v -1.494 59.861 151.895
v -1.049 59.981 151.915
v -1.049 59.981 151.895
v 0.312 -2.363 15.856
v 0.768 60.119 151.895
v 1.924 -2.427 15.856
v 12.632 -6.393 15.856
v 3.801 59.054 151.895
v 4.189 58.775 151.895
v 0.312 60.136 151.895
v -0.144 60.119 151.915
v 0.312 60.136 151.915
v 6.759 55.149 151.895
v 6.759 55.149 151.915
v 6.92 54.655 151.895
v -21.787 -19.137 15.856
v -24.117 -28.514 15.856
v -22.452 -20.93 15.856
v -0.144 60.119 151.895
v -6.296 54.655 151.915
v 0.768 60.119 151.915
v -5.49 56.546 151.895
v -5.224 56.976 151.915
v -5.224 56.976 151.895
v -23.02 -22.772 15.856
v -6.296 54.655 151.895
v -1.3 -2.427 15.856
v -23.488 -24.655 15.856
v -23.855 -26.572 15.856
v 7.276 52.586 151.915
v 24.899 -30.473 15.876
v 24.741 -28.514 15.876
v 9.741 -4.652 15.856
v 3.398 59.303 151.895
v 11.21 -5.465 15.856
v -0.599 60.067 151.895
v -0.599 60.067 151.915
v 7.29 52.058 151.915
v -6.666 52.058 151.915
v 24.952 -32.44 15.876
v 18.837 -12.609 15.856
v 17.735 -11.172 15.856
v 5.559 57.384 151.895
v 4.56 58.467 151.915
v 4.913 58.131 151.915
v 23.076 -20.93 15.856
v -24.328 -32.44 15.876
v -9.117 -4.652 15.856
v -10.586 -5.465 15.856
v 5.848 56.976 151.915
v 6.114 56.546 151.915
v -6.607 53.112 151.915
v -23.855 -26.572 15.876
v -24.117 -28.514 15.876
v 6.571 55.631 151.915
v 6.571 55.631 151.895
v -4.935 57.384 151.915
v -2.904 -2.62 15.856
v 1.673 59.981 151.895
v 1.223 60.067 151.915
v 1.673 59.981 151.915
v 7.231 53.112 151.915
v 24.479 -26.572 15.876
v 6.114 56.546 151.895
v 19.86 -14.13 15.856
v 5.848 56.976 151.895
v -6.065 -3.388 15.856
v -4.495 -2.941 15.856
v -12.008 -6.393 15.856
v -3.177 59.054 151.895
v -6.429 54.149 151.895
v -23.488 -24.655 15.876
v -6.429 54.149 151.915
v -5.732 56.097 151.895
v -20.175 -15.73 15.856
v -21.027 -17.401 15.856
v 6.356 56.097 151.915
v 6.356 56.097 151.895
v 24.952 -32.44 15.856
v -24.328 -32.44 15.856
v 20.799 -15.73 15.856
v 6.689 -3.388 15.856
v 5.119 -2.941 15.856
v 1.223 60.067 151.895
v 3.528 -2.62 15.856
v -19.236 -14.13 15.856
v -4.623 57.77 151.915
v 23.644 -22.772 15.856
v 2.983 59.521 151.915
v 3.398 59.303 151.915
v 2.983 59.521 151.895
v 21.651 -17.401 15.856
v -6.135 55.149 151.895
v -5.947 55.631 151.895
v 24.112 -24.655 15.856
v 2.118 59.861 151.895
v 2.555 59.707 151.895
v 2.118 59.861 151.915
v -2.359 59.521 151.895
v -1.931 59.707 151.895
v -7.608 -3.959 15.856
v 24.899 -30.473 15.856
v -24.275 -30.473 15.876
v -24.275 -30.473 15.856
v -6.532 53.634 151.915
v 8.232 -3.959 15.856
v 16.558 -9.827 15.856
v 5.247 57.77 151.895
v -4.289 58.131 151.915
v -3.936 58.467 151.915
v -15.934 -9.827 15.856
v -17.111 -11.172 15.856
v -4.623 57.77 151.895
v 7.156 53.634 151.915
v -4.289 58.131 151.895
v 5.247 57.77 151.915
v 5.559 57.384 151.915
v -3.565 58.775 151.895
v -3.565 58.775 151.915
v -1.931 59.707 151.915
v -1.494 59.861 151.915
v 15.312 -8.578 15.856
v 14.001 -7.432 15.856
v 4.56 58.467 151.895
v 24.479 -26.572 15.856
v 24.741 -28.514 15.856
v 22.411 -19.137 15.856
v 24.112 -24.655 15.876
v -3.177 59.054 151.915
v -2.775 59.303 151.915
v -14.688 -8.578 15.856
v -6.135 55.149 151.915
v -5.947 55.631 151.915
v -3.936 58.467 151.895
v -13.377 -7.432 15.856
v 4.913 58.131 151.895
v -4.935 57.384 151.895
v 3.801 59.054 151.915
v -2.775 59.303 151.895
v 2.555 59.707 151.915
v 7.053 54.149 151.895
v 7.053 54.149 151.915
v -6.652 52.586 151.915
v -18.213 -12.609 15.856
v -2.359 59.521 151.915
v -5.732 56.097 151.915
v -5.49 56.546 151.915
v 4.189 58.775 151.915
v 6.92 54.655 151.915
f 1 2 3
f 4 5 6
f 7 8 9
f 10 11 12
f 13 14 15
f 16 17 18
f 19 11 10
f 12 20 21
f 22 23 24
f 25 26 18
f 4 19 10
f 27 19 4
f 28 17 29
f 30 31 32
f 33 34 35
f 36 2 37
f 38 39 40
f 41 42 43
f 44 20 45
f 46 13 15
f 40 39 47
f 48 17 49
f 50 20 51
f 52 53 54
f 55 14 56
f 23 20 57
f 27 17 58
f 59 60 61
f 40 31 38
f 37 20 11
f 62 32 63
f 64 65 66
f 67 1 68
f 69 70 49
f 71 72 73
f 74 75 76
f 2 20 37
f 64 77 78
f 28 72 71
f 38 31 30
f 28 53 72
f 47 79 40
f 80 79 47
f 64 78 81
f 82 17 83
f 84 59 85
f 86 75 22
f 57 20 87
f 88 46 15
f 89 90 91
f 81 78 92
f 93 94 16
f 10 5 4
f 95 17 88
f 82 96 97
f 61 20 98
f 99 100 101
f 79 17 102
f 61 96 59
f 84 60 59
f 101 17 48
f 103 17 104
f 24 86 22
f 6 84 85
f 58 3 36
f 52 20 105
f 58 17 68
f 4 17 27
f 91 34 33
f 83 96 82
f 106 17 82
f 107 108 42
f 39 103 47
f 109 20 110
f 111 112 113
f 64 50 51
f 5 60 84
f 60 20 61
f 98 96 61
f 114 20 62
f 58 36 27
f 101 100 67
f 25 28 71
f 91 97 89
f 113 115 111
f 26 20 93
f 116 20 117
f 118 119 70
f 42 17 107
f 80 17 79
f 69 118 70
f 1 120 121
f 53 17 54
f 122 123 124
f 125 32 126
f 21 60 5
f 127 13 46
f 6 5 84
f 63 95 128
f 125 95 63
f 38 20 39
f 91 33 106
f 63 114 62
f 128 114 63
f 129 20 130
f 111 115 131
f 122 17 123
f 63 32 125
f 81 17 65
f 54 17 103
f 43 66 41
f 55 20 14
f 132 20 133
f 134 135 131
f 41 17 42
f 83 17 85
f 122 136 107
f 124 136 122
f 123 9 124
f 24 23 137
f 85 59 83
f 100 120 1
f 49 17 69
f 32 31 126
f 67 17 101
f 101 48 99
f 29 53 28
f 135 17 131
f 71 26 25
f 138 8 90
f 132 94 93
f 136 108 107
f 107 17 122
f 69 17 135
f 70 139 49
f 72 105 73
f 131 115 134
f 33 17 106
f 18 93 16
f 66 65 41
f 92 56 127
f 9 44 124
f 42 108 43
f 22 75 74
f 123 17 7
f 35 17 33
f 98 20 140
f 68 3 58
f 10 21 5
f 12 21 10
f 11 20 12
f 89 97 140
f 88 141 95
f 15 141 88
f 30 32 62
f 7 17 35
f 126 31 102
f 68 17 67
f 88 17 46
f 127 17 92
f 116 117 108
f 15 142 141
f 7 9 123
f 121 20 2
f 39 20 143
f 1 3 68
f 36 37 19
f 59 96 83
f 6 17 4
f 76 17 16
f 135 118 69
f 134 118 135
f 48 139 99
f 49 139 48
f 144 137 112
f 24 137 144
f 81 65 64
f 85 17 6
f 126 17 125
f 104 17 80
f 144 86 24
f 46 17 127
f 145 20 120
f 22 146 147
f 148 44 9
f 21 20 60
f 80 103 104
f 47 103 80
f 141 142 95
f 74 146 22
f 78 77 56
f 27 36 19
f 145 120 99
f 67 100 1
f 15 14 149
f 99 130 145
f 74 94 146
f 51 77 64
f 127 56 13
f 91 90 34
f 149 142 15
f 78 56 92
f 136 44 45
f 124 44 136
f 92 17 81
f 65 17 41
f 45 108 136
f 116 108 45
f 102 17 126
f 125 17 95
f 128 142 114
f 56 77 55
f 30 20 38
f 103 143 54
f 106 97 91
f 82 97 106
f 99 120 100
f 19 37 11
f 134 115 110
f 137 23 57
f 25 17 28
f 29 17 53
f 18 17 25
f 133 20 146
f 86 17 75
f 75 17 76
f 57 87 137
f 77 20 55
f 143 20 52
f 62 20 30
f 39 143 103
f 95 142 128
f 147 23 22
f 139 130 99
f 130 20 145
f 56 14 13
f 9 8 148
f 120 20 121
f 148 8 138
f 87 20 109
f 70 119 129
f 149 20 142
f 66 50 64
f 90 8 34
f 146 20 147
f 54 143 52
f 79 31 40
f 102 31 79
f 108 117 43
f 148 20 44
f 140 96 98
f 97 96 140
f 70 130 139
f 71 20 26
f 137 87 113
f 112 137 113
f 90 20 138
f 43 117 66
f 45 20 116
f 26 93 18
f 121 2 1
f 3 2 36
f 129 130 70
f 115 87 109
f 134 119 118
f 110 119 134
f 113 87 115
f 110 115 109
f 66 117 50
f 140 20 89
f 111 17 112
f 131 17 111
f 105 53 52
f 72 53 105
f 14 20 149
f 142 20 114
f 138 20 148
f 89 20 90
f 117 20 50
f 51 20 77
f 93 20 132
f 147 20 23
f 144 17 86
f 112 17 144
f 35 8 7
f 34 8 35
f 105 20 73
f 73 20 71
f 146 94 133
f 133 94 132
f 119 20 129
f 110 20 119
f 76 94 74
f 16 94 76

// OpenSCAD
// sb_harp_big_side_pivot - SOUNDBOX BODY = straight-sided HALF-CONE
// D cross-section in the world X(width)-Y(depth) plane: FLAT soundboard side at Y=yflat,
// arc belly bulging to +Y. Wings dropped (arc-only width). Straight sides = hull(bass,treble).
// Body rakes in Y-Z; the two caps sit at their world Z, so the hull reproduces the rake.
nh=48;
function _hc_arc(W,D,xc,yf)=[for(i=[0:nh]) let(t=180*i/nh)[ xc+(W/2)*cos(t), yf+D*sin(t) ]];
module _hc_cap(z,xc,yf,W,D,eps) translate([0,0,z]) linear_extrude(height=eps) polygon(_hc_arc(W,D,xc,yf));
module sb_harp_big_side_pivot(){
    eps=0.02;
    bz=15.856; bxc=0.312; byf=-32.440; bW=49.280; bD=30.077;
    tz=151.895; txc=0.312; tyf=52.058; tW=13.957; tD=8.078;
    hull(){ _hc_cap(bz,bxc,byf,bW,bD,eps); _hc_cap(tz,txc,tyf,tW,tD,eps); }
}
sb_harp_big_side_pivot();
